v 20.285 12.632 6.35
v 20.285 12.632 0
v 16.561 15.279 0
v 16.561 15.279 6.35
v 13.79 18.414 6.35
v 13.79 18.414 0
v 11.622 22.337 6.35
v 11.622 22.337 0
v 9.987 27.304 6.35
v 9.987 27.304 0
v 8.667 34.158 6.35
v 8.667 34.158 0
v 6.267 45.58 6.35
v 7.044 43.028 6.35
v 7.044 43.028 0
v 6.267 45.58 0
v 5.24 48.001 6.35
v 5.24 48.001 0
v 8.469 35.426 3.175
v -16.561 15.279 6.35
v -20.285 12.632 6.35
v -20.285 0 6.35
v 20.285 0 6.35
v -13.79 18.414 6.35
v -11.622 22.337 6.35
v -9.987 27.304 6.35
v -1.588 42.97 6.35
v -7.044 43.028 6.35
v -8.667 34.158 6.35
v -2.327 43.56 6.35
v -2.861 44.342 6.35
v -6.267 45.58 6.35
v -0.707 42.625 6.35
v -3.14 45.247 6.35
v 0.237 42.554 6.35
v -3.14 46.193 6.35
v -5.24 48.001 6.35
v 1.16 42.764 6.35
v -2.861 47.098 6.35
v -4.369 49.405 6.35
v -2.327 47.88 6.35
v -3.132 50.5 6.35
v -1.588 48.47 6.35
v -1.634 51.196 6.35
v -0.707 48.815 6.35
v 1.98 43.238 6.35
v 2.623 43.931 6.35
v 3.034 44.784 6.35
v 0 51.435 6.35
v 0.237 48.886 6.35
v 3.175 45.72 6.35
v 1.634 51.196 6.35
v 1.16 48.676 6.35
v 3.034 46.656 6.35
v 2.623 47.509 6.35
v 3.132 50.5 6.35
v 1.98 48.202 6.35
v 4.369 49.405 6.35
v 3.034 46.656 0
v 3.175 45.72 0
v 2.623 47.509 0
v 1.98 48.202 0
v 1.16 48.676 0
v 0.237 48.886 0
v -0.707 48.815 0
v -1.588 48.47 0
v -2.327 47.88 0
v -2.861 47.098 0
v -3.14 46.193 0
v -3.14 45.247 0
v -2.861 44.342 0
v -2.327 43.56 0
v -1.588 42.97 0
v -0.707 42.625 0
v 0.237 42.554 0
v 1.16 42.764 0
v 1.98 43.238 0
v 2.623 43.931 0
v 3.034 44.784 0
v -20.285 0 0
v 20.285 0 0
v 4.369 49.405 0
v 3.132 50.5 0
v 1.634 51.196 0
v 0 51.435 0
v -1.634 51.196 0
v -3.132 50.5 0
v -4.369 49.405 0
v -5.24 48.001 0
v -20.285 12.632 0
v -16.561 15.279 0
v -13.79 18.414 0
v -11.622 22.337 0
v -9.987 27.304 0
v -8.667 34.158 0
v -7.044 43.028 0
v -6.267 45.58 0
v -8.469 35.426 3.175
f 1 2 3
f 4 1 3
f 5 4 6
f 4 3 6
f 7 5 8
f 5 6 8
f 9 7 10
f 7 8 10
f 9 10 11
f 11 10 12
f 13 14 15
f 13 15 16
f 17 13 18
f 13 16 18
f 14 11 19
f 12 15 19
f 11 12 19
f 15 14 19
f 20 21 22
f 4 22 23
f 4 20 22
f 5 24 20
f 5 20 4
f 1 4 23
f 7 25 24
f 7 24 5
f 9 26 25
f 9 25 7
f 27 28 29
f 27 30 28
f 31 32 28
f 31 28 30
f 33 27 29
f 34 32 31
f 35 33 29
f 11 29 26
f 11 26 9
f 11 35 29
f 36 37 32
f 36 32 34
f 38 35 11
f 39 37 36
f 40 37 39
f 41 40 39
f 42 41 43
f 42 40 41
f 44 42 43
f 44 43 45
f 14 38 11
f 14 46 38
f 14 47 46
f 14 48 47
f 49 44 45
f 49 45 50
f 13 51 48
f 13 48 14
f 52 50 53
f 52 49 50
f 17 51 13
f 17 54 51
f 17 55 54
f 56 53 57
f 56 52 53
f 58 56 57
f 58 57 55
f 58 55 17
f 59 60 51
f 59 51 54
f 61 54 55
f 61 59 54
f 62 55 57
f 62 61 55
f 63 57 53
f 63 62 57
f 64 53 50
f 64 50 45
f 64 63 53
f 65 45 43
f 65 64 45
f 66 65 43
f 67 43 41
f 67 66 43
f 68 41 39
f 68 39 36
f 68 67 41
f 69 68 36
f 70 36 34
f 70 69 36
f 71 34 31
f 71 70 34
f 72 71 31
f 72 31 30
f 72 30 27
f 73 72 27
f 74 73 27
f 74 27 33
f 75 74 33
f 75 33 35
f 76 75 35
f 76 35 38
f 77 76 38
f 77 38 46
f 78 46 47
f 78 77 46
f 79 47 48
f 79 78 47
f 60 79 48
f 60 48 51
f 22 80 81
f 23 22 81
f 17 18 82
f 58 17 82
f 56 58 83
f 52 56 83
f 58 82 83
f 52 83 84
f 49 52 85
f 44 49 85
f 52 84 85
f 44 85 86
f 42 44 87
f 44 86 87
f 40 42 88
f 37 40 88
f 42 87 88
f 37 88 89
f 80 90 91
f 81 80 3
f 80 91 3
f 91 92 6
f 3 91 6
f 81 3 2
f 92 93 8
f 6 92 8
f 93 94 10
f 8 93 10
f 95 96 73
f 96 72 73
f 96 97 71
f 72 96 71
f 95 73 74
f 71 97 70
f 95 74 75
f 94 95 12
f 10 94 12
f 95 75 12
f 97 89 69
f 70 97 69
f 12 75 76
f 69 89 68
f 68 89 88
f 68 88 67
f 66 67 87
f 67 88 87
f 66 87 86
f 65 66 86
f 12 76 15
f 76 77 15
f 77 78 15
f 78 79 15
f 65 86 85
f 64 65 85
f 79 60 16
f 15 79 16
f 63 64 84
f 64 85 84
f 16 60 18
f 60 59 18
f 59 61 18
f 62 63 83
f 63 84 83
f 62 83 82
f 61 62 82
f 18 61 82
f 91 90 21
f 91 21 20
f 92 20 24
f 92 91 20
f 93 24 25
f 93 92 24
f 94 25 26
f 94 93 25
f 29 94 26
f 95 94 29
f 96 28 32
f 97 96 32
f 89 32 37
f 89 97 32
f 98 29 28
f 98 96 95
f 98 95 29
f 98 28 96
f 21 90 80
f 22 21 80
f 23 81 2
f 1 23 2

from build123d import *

# Parameters (mm, degrees)
SKETCH1_R           = 3.175
BOSS_EXTRUDE1_DEPTH = 6.35


with BuildPart() as part:
    # Sketch1 → Boss-Extrude1 (new body)
    with BuildSketch(Plane.XY):
        with BuildLine():
            Line((20.284910643, 0), (20.284910643, 12.632459137))
            add(Edge.make_bspline(
                [(20.284910643, 12.632459137), (11.321554309, 17.627045812), (9.14548831, 30.766646824), (7.127170197, 44.232555484), (5.239939742, 48.001283958)],
                knots=[0, 0, 0, 0, 0.567527293, 0.844926431, 0.844926431, 0.844926431, 0.844926431], degree=3))
            ThreePointArc((5.239939742, 48.001283958), (0, 51.435), (-5.239939742, 48.001283958))
            add(Edge.make_bspline(
                [(-20.284910643, 12.632459137), (-11.321554309, 17.627045812), (-9.14548831, 30.766646824), (-7.127170197, 44.232555484), (-5.239939742, 48.001283958)],
                knots=[0, 0, 0, 0, 0.567527293, 0.844926431, 0.844926431, 0.844926431, 0.844926431], degree=3))
            Line((-20.284910643, 12.632459137), (-20.284910643, 0))
            Line((-20.284910643, 0), (20.284910643, 0))
        make_face()
        with Locations((0, 45.72)):
            Circle(SKETCH1_R, mode=Mode.SUBTRACT)
    extrude(amount=BOSS_EXTRUDE1_DEPTH)


solid = part.part
